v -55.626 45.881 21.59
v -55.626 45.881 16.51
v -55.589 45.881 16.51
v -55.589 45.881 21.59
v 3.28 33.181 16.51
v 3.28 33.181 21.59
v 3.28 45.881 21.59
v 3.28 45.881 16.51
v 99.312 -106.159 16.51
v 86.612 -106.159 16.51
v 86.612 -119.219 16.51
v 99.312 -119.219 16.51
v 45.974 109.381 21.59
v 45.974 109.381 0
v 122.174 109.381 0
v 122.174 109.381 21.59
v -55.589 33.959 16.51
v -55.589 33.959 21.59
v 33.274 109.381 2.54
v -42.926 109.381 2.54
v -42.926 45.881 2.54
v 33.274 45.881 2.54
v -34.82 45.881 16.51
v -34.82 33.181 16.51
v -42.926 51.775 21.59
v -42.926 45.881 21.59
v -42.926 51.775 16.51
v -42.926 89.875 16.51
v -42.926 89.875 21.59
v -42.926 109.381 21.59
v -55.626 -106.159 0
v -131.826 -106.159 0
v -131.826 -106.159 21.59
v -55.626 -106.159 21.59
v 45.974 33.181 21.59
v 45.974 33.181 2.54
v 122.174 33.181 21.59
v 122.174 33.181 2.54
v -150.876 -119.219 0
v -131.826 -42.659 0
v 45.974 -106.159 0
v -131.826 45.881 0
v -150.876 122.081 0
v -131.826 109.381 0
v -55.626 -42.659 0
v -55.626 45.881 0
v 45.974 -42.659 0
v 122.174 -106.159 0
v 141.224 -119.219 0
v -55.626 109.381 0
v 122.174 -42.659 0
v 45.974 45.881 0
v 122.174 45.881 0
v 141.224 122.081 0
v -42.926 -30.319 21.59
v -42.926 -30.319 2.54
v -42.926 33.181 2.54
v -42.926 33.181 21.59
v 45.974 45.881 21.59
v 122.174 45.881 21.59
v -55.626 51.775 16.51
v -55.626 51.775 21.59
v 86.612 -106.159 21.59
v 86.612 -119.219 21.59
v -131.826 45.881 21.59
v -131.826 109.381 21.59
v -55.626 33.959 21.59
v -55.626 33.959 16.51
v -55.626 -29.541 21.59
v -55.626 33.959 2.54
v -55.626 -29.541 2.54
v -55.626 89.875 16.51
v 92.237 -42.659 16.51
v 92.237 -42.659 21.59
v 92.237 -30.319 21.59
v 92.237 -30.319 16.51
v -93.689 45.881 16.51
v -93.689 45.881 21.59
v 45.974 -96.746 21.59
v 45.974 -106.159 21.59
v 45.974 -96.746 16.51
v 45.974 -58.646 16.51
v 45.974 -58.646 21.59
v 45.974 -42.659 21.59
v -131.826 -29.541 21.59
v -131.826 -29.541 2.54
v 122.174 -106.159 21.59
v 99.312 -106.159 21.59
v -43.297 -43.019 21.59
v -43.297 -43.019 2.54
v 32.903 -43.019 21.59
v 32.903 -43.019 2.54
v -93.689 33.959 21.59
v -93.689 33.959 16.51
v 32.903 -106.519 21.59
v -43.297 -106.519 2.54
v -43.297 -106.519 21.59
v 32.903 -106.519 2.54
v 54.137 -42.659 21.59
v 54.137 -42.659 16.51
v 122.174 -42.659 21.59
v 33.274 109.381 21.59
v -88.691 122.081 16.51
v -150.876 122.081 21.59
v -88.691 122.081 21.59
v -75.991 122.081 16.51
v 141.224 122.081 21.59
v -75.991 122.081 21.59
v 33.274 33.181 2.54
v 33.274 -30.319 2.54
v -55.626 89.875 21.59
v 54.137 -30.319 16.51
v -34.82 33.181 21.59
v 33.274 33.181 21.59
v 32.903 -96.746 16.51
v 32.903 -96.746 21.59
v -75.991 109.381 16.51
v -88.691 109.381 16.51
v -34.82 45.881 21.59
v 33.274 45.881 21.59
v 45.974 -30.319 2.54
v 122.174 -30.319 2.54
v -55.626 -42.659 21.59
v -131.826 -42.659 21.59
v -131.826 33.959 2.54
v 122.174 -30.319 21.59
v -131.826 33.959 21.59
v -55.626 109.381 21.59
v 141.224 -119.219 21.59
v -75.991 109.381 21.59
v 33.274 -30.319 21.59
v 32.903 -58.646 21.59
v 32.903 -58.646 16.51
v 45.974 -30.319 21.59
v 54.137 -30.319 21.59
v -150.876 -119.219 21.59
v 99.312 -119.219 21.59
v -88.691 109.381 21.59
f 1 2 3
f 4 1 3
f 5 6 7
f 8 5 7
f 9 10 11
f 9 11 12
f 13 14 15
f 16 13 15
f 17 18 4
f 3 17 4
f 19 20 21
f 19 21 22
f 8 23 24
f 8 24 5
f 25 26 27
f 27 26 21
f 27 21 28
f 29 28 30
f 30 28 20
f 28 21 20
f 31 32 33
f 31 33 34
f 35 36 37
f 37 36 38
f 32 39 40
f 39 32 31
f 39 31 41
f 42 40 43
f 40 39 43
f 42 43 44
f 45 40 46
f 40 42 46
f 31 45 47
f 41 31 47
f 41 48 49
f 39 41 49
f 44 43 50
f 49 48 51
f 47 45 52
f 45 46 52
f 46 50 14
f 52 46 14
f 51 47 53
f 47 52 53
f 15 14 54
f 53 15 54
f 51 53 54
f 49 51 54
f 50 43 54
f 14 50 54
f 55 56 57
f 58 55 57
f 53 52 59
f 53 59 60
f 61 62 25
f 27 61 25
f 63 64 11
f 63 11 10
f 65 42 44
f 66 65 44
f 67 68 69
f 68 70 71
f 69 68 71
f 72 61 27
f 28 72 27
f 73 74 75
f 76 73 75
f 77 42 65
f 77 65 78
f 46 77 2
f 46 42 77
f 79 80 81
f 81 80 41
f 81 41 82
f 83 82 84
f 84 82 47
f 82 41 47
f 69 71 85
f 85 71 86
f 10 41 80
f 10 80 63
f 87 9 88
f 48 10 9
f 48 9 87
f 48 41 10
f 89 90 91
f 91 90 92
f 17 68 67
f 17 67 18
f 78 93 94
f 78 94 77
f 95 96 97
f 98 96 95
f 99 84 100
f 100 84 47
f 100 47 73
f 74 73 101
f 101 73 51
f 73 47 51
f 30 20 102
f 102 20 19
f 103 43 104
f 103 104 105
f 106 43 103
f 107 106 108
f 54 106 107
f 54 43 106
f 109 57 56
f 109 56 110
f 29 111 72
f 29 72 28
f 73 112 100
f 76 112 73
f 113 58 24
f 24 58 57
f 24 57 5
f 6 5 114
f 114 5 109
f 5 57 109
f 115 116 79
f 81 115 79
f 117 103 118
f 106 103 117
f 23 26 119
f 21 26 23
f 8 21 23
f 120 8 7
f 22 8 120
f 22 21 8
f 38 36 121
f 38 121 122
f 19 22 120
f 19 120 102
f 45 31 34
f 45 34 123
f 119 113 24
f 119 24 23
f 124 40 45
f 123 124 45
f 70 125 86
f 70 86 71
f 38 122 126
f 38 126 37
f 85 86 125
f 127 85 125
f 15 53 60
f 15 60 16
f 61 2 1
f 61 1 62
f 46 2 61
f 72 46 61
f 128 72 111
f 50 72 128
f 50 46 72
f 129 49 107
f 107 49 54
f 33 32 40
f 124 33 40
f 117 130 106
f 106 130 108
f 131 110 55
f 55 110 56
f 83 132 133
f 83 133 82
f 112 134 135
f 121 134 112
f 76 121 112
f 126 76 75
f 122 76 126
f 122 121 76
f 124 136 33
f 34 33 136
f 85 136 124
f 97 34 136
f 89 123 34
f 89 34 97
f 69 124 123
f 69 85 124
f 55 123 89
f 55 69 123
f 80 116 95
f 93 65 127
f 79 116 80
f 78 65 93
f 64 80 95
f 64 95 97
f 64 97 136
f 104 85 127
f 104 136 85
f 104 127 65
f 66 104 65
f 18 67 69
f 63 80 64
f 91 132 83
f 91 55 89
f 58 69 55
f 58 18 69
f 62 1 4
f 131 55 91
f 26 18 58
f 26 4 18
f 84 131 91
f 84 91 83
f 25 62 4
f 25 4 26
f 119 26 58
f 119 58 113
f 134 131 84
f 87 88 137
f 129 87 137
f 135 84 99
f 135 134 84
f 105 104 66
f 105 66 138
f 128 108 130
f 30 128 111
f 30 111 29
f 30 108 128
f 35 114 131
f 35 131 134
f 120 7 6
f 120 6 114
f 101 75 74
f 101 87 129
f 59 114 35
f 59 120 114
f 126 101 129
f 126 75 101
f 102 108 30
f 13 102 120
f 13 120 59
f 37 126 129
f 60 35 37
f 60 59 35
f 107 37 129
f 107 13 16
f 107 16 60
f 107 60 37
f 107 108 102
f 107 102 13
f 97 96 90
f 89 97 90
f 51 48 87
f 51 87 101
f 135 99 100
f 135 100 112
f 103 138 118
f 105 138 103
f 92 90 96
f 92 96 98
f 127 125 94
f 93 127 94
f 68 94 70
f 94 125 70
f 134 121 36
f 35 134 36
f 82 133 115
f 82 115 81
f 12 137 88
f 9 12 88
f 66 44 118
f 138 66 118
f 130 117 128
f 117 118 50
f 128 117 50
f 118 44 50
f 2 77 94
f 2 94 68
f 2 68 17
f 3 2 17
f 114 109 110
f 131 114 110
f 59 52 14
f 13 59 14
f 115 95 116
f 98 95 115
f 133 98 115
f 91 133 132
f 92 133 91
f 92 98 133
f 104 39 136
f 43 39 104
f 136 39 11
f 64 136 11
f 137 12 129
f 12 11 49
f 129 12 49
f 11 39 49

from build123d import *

# Parameters (mm, degrees)
F0_W     = 292.1
F0_H     = 241.3
F0_W_2   = 76.2
F0_H_2   = 63.5
F1_DEPTH = 21.59
F2_DEPTH = 2.54
F3_W     = 38.1
F3_H     = 11.9225998908
F3_W_2   = 12.7
F3_H_2   = 38.1
F3_H_3   = 12.7
F3_H_4   = 13.060019505
F3_H_5   = 12.339980495
F3_W_3   = 13.0705659449
F4_DEPTH = 5.08


with BuildPart() as f1:
    # F0 (on Top) → F1 (new body)
    with BuildSketch(Plane.XY):
        with Locations((-4.8260282278, 1.4313216329)):
            Rectangle(F0_W, F0_H)
        with Locations((-93.7260282278, -74.4086588621)):
            Rectangle(F0_W_2, F0_H_2, mode=Mode.SUBTRACT)
        with Locations((-5.1965941727, -74.7686783671)):
            Rectangle(F0_W_2, F0_H_2, mode=Mode.SUBTRACT)
        with Locations((84.0739717722, -74.4086588621)):
            Rectangle(F0_W_2, F0_H_2, mode=Mode.SUBTRACT)
        Polygon((-42.9260282278, -30.3186783671), (-42.9260282278, 9.6084550023), (-42.9260282278, 33.1813216329), (33.2739717722, 33.1813216329), (33.2739717722, -30.3186783671), align=None, mode=Mode.SUBTRACT)
        with Locations((84.0739717722, 1.4313216329)):
            Rectangle(F0_W_2, F0_H_2, mode=Mode.SUBTRACT)
        Polygon((-131.8260282278, 33.958721742), (-55.6260282278, 33.958721742), (-55.6260282278, 9.6084550023), (-55.6260282278, -29.541278258), (-131.8260282278, -29.541278258), align=None, mode=Mode.SUBTRACT)
        with Locations((-93.7260282278, 77.6313216329)):
            Rectangle(F0_W_2, F0_H_2, mode=Mode.SUBTRACT)
        with Locations((-4.8260282278, 77.6313216329)):
            Rectangle(F0_W_2, F0_H_2, mode=Mode.SUBTRACT)
        with Locations((84.0739714861, 77.6313216329)):
            Rectangle(F0_W_2, F0_H_2, mode=Mode.SUBTRACT)
    extrude(amount=F1_DEPTH)

    # F0 (on Top) → F2 (join)
    with BuildSketch(Plane.XY):
        with Locations((-4.8260282278, 77.6313216329)):
            Rectangle(F0_W_2, F0_H_2)
        Polygon((-42.9260282278, 33.1813216329), (-42.9260282278, 9.6084550023), (-42.9260282278, -30.3186783671), (33.2739717722, -30.3186783671), (33.2739717722, 33.1813216329), align=None)
        with Locations((-5.1965941727, -74.7686783671)):
            Rectangle(F0_W_2, F0_H_2)
        Polygon((-55.6260282278, 9.6084550023), (-55.6260282278, 33.958721742), (-131.8260282278, 33.958721742), (-131.8260282278, -29.541278258), (-55.6260282278, -29.541278258), align=None)
        with Locations((84.0739717722, 1.4313216329)):
            Rectangle(F0_W_2, F0_H_2)
    extrude(amount=F2_DEPTH)

    # F3 (on face) → F4 (cut)
    with BuildSketch(Plane.XY.offset(21.59)):
        with Locations((-74.6390915036, 39.9200216874)):
            Rectangle(F3_W, F3_H)
        with Locations((-49.2760282278, 70.8251611769)):
            Rectangle(F3_W_2, F3_H_2)
        with Locations((-15.7696923733, 39.5313216329)):
            Rectangle(F3_W, F3_H_3)
        with Locations((-82.3410557747, 115.7313216329)):
            Rectangle(F3_W_2, F3_H_3)
        with Locations((92.96223948, -112.6886686146)):
            Rectangle(F3_W_2, F3_H_4)
        with Locations((73.1869616985, -36.4886686146)):
            Rectangle(F3_W, F3_H_5)
        with Locations((39.4386887997, -77.696109426)):
            Rectangle(F3_W_3, F3_H_2)
    extrude(amount=-F4_DEPTH, mode=Mode.SUBTRACT)


solid = f1.part
